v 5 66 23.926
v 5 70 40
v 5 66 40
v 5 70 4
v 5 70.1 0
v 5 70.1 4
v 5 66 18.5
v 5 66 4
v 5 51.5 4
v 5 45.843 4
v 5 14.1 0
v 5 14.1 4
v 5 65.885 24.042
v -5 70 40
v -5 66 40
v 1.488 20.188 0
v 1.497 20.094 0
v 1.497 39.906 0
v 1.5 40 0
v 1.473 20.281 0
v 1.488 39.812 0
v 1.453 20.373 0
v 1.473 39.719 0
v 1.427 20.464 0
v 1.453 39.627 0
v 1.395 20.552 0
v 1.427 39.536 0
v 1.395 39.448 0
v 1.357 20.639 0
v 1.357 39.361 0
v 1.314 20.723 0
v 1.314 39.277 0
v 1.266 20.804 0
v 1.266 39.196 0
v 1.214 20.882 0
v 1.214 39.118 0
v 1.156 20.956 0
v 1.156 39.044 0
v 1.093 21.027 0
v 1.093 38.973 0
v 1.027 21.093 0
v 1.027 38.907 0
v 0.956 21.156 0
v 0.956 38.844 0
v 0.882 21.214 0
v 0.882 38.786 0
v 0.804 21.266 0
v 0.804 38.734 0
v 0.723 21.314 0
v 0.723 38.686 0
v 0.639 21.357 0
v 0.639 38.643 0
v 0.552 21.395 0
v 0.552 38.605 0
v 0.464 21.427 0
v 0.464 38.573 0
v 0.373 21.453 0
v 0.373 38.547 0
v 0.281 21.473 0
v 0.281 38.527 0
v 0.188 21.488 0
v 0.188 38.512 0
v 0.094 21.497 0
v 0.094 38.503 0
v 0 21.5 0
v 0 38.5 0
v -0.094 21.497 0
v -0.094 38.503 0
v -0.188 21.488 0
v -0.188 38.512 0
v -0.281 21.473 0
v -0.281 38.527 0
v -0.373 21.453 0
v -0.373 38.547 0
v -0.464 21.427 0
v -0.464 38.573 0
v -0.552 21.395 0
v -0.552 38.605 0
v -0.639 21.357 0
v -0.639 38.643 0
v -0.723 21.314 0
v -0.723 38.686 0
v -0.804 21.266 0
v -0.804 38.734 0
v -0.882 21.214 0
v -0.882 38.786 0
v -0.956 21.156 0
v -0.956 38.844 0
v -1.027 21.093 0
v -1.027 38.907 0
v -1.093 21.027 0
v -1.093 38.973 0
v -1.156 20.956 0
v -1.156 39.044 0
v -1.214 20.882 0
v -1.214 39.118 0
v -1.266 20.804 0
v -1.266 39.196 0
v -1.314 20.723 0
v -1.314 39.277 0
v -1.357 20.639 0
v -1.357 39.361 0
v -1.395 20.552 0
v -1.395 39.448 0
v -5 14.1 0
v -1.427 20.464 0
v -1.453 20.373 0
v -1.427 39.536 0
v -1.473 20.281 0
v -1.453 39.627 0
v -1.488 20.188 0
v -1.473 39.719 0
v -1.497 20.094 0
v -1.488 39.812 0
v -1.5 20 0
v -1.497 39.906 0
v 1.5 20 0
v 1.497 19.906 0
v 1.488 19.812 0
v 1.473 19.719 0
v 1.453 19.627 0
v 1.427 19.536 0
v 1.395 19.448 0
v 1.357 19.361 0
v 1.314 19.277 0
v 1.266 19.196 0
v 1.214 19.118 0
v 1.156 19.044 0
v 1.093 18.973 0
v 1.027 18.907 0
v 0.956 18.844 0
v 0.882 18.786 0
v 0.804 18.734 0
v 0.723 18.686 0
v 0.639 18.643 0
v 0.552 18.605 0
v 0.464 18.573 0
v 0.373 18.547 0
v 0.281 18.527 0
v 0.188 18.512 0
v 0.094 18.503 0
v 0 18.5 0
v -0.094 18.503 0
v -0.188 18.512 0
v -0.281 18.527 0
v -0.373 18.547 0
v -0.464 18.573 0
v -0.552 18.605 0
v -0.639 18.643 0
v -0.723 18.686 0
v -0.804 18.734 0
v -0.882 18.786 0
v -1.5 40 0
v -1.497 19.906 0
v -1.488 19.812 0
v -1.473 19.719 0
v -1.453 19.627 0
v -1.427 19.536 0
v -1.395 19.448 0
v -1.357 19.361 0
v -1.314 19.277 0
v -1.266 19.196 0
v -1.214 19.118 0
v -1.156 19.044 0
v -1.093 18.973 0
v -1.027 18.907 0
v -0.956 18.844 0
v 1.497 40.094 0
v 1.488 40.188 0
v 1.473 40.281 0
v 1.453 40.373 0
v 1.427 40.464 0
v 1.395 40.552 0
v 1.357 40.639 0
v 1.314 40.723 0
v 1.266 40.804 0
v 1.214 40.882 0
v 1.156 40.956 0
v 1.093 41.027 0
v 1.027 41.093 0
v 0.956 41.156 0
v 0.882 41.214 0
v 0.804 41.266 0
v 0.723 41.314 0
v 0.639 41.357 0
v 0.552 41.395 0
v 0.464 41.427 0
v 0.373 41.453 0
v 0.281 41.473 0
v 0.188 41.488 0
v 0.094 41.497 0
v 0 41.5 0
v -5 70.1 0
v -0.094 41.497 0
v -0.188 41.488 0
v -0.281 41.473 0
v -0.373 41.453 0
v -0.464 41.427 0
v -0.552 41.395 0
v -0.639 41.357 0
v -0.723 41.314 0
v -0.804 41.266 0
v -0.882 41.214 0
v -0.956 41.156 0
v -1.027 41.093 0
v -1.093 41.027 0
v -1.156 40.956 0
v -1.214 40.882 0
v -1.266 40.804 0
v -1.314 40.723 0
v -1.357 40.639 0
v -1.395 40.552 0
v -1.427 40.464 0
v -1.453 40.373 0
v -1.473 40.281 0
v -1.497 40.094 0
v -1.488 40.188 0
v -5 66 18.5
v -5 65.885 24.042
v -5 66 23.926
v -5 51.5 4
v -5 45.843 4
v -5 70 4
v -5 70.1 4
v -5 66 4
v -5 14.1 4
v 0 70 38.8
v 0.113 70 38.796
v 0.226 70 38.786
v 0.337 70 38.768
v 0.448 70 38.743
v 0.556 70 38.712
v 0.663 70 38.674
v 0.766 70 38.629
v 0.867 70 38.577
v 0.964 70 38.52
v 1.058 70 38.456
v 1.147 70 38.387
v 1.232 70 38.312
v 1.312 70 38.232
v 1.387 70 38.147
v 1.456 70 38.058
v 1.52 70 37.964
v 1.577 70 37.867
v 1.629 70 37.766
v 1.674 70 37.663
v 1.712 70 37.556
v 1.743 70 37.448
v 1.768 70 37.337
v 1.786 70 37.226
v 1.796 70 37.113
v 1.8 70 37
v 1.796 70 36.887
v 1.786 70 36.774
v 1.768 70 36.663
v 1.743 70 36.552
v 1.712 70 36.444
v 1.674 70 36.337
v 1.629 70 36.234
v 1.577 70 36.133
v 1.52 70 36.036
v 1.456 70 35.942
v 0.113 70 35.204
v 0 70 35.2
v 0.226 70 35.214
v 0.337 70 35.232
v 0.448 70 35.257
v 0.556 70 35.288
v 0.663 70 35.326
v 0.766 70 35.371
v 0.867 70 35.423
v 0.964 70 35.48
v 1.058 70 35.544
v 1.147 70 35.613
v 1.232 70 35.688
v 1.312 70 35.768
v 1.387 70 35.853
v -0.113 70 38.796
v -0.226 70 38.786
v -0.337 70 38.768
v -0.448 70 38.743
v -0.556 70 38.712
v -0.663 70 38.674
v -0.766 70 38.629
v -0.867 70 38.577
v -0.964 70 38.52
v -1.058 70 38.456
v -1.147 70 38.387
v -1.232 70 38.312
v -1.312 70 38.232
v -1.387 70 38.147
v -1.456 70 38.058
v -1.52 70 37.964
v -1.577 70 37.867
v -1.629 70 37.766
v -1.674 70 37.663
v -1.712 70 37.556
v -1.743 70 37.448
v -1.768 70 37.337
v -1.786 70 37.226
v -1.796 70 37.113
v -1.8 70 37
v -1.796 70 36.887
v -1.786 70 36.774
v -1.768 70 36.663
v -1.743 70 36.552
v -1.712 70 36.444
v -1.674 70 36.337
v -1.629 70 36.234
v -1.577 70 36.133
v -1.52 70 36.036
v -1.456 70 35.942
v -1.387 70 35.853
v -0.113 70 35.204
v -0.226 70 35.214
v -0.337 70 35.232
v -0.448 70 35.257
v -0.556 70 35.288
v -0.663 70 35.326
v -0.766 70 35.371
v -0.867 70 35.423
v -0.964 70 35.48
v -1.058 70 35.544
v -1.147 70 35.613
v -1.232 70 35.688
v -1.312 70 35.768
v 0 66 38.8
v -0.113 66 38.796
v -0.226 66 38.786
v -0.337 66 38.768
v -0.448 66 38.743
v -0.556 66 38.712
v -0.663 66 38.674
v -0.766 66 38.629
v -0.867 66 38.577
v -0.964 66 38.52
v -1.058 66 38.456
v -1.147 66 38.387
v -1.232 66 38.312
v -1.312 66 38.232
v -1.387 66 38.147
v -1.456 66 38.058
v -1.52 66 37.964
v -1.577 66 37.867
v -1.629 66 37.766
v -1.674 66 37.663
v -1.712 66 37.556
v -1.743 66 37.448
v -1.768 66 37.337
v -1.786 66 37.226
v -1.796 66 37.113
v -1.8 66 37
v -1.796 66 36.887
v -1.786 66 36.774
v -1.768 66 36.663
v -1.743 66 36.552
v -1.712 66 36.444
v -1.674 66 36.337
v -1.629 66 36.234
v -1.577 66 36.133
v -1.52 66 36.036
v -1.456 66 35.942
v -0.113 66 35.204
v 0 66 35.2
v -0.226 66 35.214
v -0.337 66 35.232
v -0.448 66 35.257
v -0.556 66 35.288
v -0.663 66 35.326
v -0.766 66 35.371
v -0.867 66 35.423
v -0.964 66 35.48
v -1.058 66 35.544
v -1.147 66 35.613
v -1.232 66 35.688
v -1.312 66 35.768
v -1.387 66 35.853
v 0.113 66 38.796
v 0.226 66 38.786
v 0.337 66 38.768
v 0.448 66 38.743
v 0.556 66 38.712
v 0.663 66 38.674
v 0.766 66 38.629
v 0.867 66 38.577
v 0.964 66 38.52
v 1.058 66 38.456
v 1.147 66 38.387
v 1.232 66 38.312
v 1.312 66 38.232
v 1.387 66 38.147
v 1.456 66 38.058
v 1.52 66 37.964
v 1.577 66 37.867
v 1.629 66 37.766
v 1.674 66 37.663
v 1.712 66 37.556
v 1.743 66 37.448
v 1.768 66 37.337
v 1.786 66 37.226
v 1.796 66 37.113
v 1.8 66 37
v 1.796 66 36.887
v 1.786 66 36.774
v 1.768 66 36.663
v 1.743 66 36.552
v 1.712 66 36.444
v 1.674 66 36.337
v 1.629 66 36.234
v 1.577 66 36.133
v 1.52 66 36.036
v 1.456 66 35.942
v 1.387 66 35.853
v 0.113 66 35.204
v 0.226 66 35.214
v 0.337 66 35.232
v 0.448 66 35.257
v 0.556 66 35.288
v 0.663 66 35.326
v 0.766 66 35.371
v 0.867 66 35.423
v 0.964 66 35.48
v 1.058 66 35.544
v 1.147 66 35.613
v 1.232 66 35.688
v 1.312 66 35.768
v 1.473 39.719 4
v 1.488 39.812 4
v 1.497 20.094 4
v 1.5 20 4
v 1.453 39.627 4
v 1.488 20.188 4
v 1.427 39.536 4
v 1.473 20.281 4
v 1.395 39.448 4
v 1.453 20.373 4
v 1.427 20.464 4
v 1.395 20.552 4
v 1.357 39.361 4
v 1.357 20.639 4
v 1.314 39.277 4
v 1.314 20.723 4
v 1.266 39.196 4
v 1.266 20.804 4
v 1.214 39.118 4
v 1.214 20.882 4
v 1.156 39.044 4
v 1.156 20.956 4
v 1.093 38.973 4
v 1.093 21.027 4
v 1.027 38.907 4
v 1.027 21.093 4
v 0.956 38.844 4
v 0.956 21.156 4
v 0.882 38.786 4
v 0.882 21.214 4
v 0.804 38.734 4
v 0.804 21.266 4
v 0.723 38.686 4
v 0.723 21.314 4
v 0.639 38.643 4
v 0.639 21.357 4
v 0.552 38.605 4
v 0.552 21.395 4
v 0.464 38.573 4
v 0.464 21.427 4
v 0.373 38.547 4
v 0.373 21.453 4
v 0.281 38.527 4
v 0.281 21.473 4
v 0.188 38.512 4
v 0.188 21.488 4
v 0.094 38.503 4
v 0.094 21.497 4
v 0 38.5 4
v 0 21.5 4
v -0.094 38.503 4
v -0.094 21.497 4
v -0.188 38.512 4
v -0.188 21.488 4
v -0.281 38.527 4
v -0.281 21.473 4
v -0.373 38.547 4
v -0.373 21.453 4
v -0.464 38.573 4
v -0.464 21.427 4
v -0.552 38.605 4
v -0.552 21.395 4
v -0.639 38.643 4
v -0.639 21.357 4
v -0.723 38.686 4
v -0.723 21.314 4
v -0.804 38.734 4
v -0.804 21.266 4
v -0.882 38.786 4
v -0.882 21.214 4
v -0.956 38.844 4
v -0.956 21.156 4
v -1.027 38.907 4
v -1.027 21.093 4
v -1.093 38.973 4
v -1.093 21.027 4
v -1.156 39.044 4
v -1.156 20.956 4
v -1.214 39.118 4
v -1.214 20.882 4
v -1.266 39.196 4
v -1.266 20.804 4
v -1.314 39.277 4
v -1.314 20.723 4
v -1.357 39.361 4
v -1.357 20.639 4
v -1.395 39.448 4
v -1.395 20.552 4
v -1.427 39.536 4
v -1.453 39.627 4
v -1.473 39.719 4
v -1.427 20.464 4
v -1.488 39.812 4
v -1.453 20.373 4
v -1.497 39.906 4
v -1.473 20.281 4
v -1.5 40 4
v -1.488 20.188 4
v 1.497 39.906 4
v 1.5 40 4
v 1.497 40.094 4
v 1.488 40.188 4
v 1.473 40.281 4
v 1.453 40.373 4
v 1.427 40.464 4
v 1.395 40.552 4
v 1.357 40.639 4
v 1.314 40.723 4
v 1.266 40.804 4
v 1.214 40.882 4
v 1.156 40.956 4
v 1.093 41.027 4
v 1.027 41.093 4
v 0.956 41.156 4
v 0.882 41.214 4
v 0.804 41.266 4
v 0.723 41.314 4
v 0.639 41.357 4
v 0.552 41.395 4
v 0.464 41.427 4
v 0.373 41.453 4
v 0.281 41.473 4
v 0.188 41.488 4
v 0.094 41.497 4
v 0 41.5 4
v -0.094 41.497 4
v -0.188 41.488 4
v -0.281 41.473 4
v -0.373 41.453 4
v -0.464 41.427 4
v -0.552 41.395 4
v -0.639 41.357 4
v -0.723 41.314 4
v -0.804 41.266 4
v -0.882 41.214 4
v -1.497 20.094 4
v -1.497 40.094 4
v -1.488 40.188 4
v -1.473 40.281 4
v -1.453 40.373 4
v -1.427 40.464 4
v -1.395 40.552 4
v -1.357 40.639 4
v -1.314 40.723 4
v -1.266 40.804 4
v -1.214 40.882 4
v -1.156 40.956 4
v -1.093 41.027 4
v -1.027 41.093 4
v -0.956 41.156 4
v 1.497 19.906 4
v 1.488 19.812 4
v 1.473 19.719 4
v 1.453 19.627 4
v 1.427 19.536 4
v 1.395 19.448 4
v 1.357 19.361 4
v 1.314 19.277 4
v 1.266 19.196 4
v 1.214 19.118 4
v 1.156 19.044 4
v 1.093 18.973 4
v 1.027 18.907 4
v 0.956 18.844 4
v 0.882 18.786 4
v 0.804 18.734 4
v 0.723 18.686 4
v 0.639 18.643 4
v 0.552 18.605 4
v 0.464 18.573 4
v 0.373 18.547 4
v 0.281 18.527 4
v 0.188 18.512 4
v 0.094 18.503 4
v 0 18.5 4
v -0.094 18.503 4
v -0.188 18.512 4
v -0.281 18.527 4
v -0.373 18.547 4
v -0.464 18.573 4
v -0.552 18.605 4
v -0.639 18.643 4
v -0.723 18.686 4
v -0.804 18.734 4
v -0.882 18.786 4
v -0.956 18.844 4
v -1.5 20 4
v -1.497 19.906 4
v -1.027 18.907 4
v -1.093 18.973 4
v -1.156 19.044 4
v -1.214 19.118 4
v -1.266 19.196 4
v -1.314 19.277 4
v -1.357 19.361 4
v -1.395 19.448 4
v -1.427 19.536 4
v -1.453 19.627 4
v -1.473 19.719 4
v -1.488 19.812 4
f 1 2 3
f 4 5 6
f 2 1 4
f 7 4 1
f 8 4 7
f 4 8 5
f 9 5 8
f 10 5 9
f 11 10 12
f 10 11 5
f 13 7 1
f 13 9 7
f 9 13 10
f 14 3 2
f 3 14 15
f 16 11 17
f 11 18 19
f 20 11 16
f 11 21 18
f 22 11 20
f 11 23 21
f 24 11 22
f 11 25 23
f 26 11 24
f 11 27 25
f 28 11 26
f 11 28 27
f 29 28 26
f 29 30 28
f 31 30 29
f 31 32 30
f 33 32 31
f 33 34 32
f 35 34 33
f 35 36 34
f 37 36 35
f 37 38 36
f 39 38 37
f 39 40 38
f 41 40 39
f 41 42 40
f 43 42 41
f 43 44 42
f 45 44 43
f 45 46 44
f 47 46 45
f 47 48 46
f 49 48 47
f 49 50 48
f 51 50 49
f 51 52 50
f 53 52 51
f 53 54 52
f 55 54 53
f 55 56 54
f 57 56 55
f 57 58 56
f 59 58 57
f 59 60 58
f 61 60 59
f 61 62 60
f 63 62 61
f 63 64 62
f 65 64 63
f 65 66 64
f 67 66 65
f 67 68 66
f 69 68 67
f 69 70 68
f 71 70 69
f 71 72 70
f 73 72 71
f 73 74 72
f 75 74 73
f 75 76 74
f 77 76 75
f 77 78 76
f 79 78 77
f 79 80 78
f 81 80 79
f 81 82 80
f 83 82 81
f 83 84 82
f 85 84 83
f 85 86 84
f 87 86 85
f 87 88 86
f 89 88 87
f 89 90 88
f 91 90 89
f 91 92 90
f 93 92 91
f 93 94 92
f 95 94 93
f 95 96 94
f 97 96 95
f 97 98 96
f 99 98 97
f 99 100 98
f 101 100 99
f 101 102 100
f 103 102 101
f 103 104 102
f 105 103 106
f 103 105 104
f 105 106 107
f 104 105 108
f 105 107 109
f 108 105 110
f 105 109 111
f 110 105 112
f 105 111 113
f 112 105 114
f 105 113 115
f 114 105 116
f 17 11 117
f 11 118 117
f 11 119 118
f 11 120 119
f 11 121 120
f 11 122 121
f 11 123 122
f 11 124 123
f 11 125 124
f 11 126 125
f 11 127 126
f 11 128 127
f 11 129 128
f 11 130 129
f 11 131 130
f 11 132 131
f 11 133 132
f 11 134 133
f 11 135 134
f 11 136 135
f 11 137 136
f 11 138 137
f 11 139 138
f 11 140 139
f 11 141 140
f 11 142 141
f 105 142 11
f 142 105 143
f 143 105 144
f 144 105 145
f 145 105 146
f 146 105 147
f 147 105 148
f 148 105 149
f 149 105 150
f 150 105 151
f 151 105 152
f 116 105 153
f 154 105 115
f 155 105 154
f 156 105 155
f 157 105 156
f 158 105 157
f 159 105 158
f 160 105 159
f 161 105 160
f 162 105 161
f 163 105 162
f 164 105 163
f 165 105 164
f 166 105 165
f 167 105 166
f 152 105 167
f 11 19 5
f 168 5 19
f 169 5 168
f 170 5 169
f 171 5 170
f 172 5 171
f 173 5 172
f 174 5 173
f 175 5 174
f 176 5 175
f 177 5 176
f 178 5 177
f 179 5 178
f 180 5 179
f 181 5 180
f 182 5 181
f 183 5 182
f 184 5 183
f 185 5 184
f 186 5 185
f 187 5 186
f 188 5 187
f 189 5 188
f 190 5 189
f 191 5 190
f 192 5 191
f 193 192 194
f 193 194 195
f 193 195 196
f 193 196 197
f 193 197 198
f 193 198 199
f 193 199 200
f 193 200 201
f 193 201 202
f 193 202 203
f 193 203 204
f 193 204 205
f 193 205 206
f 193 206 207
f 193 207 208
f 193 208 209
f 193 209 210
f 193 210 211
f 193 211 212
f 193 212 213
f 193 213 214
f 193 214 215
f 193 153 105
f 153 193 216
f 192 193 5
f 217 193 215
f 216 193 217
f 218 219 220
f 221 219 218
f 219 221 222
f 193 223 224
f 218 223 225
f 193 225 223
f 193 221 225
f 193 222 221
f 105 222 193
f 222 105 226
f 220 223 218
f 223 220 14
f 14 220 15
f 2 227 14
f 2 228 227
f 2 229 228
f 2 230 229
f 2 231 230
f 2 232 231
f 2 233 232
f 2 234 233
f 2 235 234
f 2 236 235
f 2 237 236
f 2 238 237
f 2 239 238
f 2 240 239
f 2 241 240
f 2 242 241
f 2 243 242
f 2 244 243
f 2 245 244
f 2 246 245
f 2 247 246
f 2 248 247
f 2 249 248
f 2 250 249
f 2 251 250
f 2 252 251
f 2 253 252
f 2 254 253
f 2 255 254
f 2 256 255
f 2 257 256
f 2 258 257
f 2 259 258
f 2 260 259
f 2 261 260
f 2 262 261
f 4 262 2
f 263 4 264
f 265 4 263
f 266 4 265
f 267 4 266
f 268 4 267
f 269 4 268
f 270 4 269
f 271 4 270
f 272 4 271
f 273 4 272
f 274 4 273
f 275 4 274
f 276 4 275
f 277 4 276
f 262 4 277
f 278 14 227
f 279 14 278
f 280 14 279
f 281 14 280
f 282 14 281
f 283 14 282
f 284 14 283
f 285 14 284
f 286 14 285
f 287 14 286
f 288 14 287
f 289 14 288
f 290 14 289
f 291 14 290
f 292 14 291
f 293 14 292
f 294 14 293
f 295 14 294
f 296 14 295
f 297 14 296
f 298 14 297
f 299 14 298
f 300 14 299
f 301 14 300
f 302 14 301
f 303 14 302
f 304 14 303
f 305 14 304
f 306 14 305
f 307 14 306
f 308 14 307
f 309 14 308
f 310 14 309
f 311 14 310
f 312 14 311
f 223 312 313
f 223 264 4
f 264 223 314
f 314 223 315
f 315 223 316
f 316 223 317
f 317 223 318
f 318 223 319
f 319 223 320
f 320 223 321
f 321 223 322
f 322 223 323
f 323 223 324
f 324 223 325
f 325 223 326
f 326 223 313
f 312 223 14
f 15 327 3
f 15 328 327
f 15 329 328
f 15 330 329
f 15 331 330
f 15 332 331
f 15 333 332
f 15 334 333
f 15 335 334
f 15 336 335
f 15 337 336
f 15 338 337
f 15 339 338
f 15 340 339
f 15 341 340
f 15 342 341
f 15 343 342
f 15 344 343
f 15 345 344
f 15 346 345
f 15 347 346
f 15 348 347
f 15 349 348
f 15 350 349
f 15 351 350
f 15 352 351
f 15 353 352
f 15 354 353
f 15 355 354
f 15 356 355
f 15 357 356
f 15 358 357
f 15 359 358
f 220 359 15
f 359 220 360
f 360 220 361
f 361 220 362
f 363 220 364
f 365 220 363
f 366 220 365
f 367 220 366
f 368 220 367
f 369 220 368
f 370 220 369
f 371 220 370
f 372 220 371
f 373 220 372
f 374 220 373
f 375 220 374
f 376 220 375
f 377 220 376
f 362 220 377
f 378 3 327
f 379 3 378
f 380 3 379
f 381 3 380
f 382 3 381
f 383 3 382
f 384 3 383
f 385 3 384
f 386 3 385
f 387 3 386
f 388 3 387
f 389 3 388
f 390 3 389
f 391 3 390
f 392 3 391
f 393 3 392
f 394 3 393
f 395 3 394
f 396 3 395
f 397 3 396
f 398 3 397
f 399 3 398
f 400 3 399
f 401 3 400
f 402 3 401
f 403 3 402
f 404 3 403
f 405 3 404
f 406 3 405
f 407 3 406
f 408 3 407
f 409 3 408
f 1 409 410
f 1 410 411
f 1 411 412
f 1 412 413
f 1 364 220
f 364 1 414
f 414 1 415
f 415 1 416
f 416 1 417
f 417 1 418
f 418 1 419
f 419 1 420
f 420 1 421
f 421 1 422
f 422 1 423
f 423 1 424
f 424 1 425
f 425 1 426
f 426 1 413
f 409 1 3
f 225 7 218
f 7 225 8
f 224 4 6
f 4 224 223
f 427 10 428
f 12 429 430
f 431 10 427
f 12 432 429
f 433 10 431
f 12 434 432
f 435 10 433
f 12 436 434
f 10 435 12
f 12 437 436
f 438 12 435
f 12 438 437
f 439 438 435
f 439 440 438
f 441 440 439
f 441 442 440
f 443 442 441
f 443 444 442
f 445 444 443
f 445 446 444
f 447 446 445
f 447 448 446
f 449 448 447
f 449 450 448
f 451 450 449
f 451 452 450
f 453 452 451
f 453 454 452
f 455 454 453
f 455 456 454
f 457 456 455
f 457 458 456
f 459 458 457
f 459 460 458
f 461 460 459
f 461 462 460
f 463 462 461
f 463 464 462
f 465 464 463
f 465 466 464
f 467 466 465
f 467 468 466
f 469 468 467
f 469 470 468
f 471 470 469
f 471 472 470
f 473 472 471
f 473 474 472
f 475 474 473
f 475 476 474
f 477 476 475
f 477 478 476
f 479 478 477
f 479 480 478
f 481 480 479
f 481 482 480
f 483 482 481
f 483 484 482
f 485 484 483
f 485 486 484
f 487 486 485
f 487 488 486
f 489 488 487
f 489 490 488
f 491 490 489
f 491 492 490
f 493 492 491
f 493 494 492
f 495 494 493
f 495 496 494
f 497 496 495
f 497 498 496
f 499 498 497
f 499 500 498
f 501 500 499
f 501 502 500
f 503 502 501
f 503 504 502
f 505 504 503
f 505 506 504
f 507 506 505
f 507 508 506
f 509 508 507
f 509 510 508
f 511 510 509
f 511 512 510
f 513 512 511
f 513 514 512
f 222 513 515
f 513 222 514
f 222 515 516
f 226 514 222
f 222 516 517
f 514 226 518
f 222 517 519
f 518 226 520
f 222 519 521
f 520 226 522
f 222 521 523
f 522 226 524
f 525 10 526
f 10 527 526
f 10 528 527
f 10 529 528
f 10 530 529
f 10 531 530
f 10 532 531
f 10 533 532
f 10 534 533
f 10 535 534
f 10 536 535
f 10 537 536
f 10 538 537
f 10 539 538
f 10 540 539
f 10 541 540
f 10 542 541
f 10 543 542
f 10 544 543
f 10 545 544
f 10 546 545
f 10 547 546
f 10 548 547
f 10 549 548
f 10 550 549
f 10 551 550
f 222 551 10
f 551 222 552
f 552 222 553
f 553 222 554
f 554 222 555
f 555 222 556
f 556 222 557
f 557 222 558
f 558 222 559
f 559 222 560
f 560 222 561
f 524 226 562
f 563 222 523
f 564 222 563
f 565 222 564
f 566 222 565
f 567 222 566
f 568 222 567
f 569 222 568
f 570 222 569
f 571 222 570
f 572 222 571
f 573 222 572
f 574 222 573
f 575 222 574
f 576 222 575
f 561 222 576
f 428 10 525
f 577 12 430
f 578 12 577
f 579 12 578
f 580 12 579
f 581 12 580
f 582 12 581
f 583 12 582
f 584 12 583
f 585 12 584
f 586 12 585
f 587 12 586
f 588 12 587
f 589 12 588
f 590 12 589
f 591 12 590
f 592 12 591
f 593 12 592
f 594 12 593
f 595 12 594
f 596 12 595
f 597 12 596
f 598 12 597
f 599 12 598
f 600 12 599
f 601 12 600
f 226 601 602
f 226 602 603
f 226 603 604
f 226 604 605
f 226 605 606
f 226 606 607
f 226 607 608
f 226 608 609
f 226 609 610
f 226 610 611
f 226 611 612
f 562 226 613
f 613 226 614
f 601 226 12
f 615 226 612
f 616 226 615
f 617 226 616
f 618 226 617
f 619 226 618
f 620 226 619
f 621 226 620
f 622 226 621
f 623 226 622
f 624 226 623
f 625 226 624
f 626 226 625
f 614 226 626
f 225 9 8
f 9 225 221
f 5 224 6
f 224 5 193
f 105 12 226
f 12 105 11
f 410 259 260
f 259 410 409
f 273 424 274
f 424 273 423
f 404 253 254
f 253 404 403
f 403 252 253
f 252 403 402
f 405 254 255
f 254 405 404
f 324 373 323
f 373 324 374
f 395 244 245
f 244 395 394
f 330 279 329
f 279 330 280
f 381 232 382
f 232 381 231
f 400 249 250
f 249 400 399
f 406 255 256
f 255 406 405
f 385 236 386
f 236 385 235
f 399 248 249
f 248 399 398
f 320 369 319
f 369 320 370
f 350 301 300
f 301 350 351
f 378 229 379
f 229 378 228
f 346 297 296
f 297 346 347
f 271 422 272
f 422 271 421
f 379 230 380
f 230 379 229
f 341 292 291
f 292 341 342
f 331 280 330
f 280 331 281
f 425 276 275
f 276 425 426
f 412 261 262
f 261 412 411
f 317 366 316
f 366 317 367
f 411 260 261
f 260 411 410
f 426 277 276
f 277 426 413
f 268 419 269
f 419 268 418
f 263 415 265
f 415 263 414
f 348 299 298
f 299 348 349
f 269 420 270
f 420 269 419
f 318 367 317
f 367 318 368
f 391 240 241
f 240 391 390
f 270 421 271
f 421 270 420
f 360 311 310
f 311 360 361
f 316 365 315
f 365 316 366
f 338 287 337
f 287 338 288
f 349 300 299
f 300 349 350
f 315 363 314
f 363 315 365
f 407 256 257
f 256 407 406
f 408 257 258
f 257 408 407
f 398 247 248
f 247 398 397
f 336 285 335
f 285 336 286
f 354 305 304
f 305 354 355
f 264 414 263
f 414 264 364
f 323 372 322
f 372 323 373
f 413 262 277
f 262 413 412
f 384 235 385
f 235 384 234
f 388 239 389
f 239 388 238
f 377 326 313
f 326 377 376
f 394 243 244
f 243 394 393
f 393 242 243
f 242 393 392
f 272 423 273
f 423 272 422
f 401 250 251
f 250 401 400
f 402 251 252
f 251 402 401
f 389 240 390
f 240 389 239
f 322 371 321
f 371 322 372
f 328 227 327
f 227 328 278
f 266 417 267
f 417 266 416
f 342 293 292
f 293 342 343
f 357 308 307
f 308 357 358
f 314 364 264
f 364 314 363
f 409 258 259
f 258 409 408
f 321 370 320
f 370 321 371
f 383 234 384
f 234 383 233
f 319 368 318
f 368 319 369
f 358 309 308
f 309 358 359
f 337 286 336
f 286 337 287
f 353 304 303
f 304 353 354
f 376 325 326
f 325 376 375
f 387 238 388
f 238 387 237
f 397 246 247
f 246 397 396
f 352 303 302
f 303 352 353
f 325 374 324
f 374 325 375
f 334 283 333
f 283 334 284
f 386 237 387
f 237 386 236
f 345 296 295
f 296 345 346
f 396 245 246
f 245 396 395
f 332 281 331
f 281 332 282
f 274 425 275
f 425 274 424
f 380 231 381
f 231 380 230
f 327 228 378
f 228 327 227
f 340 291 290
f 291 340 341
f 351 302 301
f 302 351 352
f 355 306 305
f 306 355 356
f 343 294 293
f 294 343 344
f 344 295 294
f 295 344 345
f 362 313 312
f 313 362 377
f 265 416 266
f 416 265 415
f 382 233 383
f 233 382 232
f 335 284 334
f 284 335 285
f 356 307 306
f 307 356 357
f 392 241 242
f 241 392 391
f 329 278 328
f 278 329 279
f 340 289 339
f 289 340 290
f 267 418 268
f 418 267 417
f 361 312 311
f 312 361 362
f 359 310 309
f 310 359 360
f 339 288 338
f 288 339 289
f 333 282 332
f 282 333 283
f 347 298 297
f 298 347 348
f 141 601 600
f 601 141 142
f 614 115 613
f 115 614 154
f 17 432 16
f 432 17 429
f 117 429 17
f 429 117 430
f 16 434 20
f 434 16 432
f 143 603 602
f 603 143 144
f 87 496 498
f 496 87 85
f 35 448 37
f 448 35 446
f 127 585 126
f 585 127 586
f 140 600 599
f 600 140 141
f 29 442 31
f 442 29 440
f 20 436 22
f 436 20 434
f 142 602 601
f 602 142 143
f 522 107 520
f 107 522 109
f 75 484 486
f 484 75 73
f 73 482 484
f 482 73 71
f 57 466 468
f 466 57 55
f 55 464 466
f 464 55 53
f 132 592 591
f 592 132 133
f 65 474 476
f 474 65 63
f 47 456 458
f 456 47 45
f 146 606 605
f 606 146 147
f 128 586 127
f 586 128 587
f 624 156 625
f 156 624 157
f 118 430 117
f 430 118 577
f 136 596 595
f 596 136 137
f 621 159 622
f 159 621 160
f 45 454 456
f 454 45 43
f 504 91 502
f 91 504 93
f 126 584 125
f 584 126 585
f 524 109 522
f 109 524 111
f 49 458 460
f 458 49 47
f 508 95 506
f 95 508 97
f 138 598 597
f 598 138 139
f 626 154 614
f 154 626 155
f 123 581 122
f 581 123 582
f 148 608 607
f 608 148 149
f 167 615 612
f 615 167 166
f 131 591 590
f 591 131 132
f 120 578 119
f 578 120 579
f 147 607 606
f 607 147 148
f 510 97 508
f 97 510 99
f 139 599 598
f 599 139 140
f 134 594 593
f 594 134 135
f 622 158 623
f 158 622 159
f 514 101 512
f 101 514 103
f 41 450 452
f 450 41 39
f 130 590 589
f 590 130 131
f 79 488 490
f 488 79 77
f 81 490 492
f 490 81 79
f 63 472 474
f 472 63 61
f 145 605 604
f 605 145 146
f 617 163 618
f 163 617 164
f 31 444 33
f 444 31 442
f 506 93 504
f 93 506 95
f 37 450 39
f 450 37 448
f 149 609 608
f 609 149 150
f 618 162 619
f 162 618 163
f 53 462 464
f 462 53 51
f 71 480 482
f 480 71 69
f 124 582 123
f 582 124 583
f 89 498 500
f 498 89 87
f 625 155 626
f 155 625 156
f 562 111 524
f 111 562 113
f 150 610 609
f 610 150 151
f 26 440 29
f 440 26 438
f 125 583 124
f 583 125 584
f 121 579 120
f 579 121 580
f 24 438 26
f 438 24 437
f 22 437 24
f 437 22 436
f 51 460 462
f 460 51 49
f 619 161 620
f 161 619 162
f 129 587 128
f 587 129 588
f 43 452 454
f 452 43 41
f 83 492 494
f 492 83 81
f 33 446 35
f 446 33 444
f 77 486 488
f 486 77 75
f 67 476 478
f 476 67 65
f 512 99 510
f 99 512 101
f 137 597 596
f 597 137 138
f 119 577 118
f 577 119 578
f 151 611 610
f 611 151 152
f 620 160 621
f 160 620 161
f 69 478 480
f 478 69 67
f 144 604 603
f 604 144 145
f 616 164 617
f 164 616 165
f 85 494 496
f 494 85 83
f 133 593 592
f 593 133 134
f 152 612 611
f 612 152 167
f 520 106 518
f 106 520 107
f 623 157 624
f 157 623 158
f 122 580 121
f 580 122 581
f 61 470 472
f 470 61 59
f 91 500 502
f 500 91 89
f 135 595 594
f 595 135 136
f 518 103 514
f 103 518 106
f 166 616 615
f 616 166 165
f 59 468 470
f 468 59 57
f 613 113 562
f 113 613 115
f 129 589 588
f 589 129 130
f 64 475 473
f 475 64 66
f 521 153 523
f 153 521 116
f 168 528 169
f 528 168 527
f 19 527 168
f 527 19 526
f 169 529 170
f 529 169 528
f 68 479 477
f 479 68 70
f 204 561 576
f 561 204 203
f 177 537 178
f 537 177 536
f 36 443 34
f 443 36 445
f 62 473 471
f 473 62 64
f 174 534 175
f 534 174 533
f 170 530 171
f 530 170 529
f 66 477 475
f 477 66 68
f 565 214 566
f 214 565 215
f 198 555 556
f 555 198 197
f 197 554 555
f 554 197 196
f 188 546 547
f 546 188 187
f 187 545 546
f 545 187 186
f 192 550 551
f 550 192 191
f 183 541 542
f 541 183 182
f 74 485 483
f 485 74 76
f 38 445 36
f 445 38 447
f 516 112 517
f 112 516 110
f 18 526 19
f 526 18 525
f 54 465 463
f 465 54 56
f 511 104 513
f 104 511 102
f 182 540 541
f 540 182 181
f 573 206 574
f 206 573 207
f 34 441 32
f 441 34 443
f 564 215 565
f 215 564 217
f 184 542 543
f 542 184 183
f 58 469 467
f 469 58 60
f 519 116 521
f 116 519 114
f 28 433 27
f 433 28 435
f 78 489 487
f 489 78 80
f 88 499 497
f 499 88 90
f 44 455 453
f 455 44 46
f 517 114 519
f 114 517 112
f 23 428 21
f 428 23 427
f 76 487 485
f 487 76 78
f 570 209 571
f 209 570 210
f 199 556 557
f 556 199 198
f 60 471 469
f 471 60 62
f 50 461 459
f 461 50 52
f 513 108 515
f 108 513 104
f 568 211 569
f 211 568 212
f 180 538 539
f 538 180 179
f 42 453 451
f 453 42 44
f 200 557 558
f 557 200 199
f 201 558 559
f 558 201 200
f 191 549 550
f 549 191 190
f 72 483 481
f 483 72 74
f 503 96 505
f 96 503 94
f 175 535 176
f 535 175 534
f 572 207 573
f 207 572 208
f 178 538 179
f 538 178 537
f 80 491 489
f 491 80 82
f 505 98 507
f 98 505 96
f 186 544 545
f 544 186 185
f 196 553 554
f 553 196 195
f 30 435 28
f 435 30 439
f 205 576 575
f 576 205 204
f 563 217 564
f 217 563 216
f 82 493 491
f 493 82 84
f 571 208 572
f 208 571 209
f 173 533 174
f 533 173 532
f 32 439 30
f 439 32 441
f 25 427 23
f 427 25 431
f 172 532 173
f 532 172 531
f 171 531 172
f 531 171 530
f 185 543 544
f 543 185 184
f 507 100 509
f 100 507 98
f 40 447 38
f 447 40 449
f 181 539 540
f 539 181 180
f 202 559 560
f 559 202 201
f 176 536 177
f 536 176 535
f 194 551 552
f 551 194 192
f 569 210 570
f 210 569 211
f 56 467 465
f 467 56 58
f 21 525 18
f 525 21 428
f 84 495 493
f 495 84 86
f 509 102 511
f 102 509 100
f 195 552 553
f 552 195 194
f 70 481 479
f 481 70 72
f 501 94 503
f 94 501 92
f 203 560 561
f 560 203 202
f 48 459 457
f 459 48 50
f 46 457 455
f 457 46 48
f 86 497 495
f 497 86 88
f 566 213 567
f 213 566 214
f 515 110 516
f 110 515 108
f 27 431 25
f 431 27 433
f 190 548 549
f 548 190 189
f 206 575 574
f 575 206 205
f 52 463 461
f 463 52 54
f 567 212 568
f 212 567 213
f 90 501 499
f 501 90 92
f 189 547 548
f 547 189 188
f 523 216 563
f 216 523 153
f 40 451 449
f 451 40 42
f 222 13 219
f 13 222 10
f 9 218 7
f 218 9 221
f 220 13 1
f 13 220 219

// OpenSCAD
Dm=24.2;
eh=10;
H=70;
e=4;

$fn=100;

piece=3;

module sup()
{
difference()
{
    union()
    {
        cylinder(d=Dm+2*e,h=eh);
        translate([-25,-6/2,0]) cube([50,6,eh]);
    }
    translate([0,0,-1]) cylinder(d=Dm,h=eh+2);
    // Vis moteur
    translate([-20,-5,eh/2]) rotate([-90,0,0]) cylinder(h=10,d=3.6);
    translate([+20,-5,eh/2]) rotate([-90,0,0]) cylinder(h=10,d=3.6);
    
}
// pied
difference()
{
translate([-eh/2,Dm/2+e/2,0])  cube([eh,H-Dm/2-e/2,eh]);
    // vis attaches coupelles
    translate([0,20,0])  cylinder(h=20,d=2);
    translate([0,40,0])  cylinder(h=20,d=2);
}
difference()
{
    translate([-30,H-e,0])  cube([60,e,eh]);
    // Vis pied
    translate([-25,0,eh/2]) rotate([-90,0,0]) cylinder(h=100,d=3.6);
    translate([+25,0,eh/2]) rotate([-90,0,0]) cylinder(h=100,d=3.6);
}


}

module pied3()
{
  // 3ème pied
difference()
{
    union()
    {
    translate([-eh/2,H-e,0])  cube([eh,e,40]);
    translate([-eh/2,Dm/2+e/2,0])  cube([eh,60-e,e]);    
    }
    translate([0,H-5,37]) rotate([-90,0,0]) cylinder(h=100,d=3.6);
    translate([0,20,0])  cylinder(h=20,d=3);
    translate([0,40,0])  cylinder(h=20,d=3);
}  
translate([-eh/2,47.5,0]) rotate([45,0,0]) cube([eh,30,e]);
}

if (piece==2)
{
difference()
{
    sup();
    translate([-50,0,-1]) cube([100,100,100]);
}
}
if (piece==1)
{
difference()
{
    sup();
    translate([-50,-100,-1]) cube([100,100,100]);
}
}
if (piece==3)
{
        pied3();
}
